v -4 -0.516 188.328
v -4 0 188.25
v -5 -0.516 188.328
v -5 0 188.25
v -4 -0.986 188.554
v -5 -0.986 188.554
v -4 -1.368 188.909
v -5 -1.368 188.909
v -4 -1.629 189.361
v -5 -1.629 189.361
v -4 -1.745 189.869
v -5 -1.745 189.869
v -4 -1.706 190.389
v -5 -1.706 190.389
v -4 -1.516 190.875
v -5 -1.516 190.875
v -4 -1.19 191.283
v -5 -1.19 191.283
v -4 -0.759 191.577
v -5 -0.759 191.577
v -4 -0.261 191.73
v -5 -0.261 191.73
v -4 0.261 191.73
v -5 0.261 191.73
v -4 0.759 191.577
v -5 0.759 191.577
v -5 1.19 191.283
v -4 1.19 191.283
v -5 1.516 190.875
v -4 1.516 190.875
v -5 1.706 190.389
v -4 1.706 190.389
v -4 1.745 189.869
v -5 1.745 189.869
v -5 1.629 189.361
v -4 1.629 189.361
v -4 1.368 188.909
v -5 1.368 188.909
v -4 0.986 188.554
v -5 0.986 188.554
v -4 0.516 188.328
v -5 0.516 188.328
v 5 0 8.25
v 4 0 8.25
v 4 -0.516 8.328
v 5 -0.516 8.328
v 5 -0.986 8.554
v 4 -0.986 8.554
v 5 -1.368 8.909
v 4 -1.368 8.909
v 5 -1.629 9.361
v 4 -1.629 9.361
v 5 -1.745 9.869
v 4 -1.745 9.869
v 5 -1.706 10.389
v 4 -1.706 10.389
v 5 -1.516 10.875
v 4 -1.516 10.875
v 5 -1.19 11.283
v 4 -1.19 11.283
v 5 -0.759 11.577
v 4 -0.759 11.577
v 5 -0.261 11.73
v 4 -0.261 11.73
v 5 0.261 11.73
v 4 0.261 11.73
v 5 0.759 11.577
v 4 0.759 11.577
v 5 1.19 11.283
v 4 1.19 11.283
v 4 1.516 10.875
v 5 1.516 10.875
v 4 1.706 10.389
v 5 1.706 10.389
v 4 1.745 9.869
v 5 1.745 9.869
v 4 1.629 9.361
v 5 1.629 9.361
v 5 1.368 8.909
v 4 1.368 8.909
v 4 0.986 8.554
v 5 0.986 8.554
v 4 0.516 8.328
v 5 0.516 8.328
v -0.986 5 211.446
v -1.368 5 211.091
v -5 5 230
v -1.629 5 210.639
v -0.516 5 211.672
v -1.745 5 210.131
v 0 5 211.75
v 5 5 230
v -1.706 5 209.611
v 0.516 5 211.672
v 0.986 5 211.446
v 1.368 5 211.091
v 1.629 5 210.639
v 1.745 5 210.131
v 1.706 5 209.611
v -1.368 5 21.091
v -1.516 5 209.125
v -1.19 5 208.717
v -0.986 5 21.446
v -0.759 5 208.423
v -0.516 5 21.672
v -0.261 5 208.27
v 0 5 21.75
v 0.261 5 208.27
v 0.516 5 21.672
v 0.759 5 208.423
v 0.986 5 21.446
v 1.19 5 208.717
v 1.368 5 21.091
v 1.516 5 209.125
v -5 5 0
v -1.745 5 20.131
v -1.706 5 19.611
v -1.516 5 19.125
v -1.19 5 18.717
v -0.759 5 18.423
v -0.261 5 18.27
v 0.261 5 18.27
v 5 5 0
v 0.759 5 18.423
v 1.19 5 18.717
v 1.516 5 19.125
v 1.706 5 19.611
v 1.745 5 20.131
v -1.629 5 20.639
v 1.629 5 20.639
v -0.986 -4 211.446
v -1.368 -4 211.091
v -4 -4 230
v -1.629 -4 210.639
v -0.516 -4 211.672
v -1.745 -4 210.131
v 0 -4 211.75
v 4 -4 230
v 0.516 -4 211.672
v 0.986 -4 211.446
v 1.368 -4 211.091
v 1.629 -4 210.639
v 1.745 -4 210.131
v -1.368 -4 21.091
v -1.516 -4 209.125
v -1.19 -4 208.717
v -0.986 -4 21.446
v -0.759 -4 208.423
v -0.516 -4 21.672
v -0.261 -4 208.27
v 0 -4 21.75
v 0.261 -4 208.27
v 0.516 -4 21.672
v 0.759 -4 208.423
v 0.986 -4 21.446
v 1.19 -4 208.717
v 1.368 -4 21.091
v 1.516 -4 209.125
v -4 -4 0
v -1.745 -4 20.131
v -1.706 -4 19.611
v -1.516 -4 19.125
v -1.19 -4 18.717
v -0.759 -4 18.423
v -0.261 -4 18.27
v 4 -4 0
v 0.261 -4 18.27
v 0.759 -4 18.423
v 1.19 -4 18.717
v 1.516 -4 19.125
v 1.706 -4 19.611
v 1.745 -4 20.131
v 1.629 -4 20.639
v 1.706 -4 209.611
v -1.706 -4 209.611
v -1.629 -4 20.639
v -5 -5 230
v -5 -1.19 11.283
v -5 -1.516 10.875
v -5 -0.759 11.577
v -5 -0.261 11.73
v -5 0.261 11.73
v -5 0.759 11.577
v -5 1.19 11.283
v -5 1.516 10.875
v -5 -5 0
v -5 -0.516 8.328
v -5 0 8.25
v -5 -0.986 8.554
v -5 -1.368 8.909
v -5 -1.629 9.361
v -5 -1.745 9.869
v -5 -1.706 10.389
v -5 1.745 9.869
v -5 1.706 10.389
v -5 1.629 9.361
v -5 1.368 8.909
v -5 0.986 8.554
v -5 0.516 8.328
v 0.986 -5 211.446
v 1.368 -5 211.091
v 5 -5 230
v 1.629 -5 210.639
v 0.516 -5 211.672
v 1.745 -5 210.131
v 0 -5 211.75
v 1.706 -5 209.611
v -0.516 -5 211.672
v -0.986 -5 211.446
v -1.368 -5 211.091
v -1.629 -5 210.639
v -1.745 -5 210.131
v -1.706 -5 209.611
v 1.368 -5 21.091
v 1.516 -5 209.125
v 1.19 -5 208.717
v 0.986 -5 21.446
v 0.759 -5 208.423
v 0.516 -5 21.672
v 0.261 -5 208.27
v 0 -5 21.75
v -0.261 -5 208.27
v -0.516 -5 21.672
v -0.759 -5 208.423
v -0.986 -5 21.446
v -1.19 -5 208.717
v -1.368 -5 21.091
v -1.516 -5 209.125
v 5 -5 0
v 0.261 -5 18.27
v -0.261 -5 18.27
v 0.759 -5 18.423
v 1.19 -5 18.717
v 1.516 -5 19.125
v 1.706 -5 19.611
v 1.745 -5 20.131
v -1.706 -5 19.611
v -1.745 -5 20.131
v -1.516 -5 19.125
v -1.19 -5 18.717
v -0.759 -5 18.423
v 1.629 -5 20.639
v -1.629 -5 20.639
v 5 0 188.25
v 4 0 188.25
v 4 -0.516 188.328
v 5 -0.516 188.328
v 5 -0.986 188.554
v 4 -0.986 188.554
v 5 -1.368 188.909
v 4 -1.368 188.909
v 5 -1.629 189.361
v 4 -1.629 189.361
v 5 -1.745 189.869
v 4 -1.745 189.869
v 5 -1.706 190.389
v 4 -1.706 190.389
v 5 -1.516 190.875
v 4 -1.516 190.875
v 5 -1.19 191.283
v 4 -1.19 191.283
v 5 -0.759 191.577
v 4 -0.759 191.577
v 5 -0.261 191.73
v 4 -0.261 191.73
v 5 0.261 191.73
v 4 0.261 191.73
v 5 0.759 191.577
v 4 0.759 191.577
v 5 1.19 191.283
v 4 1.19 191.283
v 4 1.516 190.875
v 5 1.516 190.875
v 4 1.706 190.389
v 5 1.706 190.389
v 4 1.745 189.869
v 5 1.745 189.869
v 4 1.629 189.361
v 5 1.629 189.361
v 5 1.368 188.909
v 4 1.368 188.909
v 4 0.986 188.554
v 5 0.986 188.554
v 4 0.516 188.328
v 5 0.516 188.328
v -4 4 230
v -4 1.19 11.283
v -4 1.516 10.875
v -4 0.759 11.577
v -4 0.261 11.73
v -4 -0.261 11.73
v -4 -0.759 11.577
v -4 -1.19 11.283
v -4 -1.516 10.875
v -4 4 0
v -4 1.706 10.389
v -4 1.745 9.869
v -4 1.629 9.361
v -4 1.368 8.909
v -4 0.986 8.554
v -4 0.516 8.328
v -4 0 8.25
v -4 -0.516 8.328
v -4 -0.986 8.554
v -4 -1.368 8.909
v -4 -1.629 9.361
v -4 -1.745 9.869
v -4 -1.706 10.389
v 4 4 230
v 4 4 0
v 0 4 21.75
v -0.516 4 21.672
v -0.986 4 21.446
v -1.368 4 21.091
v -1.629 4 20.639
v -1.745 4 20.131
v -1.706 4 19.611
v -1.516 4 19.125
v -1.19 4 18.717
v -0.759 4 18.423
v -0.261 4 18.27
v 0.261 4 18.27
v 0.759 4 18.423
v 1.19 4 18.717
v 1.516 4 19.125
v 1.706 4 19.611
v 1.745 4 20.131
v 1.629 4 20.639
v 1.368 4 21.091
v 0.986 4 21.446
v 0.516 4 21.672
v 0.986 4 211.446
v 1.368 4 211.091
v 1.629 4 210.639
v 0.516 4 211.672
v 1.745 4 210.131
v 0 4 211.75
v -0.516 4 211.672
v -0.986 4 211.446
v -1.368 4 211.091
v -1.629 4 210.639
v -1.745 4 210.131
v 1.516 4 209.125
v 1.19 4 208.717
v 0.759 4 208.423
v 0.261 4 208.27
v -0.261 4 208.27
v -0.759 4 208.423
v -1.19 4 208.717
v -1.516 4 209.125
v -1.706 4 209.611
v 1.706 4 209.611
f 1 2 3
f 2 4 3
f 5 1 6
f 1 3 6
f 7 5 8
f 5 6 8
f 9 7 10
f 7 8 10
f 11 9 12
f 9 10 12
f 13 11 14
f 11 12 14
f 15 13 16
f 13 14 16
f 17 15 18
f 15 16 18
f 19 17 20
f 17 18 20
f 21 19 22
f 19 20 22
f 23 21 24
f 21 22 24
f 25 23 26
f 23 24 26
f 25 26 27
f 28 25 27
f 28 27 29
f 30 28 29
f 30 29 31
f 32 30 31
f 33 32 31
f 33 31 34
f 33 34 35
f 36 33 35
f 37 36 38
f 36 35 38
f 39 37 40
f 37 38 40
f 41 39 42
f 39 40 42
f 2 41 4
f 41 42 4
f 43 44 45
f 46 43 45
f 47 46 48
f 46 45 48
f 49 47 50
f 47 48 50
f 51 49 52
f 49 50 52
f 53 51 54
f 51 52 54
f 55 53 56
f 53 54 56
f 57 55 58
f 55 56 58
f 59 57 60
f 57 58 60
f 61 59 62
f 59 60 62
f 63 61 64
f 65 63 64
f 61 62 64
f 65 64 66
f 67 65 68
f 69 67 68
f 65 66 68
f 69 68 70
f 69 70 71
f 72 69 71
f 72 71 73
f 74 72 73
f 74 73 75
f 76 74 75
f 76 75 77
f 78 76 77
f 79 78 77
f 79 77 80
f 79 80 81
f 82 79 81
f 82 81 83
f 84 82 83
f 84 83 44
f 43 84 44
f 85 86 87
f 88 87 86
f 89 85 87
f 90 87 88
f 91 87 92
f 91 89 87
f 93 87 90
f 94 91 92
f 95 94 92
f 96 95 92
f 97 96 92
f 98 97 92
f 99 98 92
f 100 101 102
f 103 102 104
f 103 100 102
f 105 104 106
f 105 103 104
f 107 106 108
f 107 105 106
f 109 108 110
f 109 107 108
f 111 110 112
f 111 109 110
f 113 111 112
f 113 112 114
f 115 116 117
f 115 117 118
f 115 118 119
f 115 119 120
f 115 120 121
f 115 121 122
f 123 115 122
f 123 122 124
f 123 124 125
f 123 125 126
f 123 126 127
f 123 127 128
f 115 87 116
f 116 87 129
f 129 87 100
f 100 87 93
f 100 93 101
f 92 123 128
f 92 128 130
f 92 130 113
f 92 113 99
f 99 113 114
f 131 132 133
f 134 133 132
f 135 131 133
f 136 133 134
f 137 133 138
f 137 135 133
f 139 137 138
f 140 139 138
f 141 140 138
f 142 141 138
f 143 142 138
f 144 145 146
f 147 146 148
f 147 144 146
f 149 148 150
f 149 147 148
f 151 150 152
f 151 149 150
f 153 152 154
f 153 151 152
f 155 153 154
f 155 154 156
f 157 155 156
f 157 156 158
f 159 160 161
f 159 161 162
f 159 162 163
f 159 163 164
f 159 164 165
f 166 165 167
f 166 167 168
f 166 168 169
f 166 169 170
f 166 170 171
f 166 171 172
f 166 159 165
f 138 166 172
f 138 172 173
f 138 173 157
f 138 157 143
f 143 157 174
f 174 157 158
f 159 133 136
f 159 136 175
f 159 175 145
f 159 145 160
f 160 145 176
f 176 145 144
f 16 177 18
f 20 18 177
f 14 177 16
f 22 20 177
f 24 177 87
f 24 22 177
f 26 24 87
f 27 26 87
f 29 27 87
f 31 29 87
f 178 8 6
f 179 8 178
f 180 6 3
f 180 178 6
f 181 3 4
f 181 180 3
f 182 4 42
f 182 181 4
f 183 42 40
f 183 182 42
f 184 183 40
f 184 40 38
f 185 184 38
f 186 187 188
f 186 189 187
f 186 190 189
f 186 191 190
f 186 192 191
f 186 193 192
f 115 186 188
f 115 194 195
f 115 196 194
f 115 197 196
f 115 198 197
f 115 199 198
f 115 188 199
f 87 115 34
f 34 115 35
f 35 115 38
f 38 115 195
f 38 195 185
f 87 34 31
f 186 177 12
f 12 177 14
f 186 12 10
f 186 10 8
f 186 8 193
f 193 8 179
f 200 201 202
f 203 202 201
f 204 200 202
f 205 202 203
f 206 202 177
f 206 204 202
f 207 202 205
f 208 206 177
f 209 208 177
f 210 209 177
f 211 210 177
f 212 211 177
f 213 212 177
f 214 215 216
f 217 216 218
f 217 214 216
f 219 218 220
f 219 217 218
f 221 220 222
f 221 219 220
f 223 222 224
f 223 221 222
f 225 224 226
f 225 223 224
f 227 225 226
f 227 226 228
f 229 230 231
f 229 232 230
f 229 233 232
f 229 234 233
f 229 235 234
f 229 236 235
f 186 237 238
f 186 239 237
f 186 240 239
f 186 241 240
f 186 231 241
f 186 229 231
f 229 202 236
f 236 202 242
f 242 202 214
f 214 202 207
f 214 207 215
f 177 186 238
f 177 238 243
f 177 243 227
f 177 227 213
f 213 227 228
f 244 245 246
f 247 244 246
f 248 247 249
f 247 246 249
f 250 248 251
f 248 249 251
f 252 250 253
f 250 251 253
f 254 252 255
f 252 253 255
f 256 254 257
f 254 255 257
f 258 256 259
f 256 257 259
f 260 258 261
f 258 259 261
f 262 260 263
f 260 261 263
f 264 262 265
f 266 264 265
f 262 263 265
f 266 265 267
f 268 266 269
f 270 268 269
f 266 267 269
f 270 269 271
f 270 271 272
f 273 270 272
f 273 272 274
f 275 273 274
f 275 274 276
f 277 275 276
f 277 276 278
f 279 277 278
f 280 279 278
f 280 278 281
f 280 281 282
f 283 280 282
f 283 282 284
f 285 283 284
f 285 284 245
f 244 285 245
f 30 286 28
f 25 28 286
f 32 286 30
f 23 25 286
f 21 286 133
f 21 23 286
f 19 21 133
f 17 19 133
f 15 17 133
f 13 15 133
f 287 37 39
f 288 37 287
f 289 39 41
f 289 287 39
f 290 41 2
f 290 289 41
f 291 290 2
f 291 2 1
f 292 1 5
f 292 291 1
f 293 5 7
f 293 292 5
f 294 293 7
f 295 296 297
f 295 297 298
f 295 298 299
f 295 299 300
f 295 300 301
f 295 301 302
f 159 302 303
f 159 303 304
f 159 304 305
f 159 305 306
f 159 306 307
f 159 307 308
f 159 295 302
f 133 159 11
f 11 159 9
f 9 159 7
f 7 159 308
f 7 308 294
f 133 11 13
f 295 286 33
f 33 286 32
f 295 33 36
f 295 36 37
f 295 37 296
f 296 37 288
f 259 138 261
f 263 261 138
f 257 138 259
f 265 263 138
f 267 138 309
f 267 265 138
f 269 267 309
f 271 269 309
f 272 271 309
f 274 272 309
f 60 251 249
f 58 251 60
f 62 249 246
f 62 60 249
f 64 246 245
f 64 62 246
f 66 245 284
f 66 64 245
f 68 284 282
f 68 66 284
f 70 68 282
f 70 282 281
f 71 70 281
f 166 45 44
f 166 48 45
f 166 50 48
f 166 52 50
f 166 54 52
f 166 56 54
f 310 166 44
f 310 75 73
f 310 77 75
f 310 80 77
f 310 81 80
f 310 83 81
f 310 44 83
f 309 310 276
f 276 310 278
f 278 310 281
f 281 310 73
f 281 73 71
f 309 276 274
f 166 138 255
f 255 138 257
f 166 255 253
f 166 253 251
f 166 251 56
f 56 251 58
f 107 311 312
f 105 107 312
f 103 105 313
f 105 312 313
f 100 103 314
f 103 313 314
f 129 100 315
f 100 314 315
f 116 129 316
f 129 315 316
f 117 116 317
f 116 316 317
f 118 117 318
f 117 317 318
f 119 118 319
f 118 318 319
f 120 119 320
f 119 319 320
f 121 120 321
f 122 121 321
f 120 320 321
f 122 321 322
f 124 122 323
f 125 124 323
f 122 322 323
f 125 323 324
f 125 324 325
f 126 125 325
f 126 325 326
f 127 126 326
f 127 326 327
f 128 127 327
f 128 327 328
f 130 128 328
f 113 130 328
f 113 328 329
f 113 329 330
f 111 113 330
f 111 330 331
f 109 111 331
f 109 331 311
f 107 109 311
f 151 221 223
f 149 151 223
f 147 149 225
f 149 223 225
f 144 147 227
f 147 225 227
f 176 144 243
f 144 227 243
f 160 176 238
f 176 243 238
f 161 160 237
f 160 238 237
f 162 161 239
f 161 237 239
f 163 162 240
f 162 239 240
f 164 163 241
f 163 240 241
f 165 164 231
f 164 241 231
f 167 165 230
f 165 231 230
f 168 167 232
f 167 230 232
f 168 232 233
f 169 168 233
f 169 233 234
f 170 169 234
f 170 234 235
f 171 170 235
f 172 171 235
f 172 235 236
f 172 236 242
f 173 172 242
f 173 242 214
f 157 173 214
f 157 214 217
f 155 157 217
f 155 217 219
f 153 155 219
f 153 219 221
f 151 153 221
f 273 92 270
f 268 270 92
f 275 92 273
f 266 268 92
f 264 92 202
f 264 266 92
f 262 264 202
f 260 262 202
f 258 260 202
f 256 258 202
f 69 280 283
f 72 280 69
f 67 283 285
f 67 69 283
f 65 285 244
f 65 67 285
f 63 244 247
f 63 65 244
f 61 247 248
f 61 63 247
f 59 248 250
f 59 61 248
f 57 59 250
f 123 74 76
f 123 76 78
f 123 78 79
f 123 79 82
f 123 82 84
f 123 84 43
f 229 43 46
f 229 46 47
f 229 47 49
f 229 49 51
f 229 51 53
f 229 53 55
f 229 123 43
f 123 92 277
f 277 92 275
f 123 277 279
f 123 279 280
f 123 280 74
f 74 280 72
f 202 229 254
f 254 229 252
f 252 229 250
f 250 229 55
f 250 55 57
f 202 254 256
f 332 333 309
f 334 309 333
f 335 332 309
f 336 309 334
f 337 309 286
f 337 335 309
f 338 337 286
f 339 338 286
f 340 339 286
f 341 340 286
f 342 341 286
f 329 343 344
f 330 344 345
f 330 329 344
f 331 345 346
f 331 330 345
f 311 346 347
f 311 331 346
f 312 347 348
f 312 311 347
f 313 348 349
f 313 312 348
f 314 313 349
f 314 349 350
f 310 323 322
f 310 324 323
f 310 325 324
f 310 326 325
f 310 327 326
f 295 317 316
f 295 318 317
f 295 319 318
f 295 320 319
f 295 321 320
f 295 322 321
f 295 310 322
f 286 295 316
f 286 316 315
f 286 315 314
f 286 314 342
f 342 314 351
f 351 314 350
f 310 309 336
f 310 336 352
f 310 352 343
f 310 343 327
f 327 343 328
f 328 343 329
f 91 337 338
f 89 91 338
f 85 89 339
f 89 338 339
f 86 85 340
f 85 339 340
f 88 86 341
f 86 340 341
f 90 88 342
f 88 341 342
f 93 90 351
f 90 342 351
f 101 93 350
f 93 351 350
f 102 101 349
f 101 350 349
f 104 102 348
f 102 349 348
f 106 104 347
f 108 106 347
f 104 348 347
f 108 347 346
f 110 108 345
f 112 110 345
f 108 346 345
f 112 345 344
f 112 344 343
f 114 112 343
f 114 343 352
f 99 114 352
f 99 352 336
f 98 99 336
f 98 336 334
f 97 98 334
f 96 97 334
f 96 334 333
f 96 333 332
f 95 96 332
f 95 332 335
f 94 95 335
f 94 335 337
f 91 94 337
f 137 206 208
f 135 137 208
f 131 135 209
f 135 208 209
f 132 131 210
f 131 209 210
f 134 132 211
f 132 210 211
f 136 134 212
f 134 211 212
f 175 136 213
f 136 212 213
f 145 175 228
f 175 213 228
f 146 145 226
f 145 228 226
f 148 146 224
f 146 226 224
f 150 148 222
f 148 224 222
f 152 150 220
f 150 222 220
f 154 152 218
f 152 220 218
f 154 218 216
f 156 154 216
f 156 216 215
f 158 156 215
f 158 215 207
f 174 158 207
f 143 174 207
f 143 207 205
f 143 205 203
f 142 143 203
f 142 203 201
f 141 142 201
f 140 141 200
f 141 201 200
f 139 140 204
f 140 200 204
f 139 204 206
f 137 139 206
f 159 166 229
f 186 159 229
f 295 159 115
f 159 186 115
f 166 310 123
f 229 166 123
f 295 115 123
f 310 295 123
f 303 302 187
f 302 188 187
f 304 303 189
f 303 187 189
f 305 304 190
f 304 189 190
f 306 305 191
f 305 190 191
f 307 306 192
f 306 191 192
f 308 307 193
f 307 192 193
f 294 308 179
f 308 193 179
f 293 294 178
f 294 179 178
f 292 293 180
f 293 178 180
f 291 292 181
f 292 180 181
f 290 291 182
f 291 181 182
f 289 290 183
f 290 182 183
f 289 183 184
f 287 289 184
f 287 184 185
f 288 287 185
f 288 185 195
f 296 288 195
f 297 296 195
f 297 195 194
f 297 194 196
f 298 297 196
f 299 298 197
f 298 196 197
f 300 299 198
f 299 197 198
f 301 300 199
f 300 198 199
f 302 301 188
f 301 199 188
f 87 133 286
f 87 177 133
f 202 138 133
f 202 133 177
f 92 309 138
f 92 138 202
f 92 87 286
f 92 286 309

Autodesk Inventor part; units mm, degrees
ref_plane "YZ Plane" through (0, 0, 0) normal (1, 0, 0) x (0, 1, 0)
ref_plane "XZ Plane" through (0, 0, 0) normal (0, 1, 0) x (-1, 0, 0)
ref_plane "XY Plane" through (0, 0, 0) normal (0, 0, 1) x (1, 0, 0)
sketch "スケッチ1" plane through (0, 0, 0) normal (0, 0, 1) x (1, 0, 0)
  line L0 (5, -5) -> (-5, -5)
  line L1 (-5, -5) -> (-5, 5)
  line L2 (-5, 5) -> (5, 5)
  line L3 (5, 5) -> (5, -5)
  line L4 (5, -5) -> (-5, 5) construction
  line L5 (-5, -5) -> (5, 5) construction
  line L6 (4, 4) -> (-4, 4)
  line L7 (-4, 4) -> (-4, -4)
  line L8 (-4, -4) -> (4, -4)
  line L9 (4, -4) -> (4, 4)
  point P0 (0, 0)
  dimension "d0" = 10
  dimension "d1" = 10
  dimension "d2" = 1
extrude "押し出し1" add sketch "スケッチ1" along normal blind 230
sketch "スケッチ2" plane through (5, -5, 0) normal (1, 0, 0) x (0, 0, -1)
  line L0 (0, 5) -> (-228.6606, 5)
  line L1 (0, 0) -> (0, 10) projected
  point P0 (-190, 5)
  point P1 (-10, 5)
  dimension "d5" = 180
  dimension "d6" = 10
hole "穴1" at (5, 0, 190) at (5, 0, 10) direction (-1, 0, 0) diameter 3.5 end through all
sketch "スケッチ3" plane through (-5, 5, 0) normal (0, 1, 0) x (1, 0, 0)
  line L0 (5, 0) -> (5, -230)
  line L1 (9, -230) -> (1, -230) projected
  line L2 (10, 0) -> (0, 0) projected
  point P0 (5, -210)
  point P1 (5, -20)
  dimension "d14" = 20
  dimension "d15" = 190
hole "穴2" at (0, 5, 210) at (0, 5, 20) direction (0, -1, 0) diameter 3.5 end through all
properties part number "small_kaku_1010_bridge"
